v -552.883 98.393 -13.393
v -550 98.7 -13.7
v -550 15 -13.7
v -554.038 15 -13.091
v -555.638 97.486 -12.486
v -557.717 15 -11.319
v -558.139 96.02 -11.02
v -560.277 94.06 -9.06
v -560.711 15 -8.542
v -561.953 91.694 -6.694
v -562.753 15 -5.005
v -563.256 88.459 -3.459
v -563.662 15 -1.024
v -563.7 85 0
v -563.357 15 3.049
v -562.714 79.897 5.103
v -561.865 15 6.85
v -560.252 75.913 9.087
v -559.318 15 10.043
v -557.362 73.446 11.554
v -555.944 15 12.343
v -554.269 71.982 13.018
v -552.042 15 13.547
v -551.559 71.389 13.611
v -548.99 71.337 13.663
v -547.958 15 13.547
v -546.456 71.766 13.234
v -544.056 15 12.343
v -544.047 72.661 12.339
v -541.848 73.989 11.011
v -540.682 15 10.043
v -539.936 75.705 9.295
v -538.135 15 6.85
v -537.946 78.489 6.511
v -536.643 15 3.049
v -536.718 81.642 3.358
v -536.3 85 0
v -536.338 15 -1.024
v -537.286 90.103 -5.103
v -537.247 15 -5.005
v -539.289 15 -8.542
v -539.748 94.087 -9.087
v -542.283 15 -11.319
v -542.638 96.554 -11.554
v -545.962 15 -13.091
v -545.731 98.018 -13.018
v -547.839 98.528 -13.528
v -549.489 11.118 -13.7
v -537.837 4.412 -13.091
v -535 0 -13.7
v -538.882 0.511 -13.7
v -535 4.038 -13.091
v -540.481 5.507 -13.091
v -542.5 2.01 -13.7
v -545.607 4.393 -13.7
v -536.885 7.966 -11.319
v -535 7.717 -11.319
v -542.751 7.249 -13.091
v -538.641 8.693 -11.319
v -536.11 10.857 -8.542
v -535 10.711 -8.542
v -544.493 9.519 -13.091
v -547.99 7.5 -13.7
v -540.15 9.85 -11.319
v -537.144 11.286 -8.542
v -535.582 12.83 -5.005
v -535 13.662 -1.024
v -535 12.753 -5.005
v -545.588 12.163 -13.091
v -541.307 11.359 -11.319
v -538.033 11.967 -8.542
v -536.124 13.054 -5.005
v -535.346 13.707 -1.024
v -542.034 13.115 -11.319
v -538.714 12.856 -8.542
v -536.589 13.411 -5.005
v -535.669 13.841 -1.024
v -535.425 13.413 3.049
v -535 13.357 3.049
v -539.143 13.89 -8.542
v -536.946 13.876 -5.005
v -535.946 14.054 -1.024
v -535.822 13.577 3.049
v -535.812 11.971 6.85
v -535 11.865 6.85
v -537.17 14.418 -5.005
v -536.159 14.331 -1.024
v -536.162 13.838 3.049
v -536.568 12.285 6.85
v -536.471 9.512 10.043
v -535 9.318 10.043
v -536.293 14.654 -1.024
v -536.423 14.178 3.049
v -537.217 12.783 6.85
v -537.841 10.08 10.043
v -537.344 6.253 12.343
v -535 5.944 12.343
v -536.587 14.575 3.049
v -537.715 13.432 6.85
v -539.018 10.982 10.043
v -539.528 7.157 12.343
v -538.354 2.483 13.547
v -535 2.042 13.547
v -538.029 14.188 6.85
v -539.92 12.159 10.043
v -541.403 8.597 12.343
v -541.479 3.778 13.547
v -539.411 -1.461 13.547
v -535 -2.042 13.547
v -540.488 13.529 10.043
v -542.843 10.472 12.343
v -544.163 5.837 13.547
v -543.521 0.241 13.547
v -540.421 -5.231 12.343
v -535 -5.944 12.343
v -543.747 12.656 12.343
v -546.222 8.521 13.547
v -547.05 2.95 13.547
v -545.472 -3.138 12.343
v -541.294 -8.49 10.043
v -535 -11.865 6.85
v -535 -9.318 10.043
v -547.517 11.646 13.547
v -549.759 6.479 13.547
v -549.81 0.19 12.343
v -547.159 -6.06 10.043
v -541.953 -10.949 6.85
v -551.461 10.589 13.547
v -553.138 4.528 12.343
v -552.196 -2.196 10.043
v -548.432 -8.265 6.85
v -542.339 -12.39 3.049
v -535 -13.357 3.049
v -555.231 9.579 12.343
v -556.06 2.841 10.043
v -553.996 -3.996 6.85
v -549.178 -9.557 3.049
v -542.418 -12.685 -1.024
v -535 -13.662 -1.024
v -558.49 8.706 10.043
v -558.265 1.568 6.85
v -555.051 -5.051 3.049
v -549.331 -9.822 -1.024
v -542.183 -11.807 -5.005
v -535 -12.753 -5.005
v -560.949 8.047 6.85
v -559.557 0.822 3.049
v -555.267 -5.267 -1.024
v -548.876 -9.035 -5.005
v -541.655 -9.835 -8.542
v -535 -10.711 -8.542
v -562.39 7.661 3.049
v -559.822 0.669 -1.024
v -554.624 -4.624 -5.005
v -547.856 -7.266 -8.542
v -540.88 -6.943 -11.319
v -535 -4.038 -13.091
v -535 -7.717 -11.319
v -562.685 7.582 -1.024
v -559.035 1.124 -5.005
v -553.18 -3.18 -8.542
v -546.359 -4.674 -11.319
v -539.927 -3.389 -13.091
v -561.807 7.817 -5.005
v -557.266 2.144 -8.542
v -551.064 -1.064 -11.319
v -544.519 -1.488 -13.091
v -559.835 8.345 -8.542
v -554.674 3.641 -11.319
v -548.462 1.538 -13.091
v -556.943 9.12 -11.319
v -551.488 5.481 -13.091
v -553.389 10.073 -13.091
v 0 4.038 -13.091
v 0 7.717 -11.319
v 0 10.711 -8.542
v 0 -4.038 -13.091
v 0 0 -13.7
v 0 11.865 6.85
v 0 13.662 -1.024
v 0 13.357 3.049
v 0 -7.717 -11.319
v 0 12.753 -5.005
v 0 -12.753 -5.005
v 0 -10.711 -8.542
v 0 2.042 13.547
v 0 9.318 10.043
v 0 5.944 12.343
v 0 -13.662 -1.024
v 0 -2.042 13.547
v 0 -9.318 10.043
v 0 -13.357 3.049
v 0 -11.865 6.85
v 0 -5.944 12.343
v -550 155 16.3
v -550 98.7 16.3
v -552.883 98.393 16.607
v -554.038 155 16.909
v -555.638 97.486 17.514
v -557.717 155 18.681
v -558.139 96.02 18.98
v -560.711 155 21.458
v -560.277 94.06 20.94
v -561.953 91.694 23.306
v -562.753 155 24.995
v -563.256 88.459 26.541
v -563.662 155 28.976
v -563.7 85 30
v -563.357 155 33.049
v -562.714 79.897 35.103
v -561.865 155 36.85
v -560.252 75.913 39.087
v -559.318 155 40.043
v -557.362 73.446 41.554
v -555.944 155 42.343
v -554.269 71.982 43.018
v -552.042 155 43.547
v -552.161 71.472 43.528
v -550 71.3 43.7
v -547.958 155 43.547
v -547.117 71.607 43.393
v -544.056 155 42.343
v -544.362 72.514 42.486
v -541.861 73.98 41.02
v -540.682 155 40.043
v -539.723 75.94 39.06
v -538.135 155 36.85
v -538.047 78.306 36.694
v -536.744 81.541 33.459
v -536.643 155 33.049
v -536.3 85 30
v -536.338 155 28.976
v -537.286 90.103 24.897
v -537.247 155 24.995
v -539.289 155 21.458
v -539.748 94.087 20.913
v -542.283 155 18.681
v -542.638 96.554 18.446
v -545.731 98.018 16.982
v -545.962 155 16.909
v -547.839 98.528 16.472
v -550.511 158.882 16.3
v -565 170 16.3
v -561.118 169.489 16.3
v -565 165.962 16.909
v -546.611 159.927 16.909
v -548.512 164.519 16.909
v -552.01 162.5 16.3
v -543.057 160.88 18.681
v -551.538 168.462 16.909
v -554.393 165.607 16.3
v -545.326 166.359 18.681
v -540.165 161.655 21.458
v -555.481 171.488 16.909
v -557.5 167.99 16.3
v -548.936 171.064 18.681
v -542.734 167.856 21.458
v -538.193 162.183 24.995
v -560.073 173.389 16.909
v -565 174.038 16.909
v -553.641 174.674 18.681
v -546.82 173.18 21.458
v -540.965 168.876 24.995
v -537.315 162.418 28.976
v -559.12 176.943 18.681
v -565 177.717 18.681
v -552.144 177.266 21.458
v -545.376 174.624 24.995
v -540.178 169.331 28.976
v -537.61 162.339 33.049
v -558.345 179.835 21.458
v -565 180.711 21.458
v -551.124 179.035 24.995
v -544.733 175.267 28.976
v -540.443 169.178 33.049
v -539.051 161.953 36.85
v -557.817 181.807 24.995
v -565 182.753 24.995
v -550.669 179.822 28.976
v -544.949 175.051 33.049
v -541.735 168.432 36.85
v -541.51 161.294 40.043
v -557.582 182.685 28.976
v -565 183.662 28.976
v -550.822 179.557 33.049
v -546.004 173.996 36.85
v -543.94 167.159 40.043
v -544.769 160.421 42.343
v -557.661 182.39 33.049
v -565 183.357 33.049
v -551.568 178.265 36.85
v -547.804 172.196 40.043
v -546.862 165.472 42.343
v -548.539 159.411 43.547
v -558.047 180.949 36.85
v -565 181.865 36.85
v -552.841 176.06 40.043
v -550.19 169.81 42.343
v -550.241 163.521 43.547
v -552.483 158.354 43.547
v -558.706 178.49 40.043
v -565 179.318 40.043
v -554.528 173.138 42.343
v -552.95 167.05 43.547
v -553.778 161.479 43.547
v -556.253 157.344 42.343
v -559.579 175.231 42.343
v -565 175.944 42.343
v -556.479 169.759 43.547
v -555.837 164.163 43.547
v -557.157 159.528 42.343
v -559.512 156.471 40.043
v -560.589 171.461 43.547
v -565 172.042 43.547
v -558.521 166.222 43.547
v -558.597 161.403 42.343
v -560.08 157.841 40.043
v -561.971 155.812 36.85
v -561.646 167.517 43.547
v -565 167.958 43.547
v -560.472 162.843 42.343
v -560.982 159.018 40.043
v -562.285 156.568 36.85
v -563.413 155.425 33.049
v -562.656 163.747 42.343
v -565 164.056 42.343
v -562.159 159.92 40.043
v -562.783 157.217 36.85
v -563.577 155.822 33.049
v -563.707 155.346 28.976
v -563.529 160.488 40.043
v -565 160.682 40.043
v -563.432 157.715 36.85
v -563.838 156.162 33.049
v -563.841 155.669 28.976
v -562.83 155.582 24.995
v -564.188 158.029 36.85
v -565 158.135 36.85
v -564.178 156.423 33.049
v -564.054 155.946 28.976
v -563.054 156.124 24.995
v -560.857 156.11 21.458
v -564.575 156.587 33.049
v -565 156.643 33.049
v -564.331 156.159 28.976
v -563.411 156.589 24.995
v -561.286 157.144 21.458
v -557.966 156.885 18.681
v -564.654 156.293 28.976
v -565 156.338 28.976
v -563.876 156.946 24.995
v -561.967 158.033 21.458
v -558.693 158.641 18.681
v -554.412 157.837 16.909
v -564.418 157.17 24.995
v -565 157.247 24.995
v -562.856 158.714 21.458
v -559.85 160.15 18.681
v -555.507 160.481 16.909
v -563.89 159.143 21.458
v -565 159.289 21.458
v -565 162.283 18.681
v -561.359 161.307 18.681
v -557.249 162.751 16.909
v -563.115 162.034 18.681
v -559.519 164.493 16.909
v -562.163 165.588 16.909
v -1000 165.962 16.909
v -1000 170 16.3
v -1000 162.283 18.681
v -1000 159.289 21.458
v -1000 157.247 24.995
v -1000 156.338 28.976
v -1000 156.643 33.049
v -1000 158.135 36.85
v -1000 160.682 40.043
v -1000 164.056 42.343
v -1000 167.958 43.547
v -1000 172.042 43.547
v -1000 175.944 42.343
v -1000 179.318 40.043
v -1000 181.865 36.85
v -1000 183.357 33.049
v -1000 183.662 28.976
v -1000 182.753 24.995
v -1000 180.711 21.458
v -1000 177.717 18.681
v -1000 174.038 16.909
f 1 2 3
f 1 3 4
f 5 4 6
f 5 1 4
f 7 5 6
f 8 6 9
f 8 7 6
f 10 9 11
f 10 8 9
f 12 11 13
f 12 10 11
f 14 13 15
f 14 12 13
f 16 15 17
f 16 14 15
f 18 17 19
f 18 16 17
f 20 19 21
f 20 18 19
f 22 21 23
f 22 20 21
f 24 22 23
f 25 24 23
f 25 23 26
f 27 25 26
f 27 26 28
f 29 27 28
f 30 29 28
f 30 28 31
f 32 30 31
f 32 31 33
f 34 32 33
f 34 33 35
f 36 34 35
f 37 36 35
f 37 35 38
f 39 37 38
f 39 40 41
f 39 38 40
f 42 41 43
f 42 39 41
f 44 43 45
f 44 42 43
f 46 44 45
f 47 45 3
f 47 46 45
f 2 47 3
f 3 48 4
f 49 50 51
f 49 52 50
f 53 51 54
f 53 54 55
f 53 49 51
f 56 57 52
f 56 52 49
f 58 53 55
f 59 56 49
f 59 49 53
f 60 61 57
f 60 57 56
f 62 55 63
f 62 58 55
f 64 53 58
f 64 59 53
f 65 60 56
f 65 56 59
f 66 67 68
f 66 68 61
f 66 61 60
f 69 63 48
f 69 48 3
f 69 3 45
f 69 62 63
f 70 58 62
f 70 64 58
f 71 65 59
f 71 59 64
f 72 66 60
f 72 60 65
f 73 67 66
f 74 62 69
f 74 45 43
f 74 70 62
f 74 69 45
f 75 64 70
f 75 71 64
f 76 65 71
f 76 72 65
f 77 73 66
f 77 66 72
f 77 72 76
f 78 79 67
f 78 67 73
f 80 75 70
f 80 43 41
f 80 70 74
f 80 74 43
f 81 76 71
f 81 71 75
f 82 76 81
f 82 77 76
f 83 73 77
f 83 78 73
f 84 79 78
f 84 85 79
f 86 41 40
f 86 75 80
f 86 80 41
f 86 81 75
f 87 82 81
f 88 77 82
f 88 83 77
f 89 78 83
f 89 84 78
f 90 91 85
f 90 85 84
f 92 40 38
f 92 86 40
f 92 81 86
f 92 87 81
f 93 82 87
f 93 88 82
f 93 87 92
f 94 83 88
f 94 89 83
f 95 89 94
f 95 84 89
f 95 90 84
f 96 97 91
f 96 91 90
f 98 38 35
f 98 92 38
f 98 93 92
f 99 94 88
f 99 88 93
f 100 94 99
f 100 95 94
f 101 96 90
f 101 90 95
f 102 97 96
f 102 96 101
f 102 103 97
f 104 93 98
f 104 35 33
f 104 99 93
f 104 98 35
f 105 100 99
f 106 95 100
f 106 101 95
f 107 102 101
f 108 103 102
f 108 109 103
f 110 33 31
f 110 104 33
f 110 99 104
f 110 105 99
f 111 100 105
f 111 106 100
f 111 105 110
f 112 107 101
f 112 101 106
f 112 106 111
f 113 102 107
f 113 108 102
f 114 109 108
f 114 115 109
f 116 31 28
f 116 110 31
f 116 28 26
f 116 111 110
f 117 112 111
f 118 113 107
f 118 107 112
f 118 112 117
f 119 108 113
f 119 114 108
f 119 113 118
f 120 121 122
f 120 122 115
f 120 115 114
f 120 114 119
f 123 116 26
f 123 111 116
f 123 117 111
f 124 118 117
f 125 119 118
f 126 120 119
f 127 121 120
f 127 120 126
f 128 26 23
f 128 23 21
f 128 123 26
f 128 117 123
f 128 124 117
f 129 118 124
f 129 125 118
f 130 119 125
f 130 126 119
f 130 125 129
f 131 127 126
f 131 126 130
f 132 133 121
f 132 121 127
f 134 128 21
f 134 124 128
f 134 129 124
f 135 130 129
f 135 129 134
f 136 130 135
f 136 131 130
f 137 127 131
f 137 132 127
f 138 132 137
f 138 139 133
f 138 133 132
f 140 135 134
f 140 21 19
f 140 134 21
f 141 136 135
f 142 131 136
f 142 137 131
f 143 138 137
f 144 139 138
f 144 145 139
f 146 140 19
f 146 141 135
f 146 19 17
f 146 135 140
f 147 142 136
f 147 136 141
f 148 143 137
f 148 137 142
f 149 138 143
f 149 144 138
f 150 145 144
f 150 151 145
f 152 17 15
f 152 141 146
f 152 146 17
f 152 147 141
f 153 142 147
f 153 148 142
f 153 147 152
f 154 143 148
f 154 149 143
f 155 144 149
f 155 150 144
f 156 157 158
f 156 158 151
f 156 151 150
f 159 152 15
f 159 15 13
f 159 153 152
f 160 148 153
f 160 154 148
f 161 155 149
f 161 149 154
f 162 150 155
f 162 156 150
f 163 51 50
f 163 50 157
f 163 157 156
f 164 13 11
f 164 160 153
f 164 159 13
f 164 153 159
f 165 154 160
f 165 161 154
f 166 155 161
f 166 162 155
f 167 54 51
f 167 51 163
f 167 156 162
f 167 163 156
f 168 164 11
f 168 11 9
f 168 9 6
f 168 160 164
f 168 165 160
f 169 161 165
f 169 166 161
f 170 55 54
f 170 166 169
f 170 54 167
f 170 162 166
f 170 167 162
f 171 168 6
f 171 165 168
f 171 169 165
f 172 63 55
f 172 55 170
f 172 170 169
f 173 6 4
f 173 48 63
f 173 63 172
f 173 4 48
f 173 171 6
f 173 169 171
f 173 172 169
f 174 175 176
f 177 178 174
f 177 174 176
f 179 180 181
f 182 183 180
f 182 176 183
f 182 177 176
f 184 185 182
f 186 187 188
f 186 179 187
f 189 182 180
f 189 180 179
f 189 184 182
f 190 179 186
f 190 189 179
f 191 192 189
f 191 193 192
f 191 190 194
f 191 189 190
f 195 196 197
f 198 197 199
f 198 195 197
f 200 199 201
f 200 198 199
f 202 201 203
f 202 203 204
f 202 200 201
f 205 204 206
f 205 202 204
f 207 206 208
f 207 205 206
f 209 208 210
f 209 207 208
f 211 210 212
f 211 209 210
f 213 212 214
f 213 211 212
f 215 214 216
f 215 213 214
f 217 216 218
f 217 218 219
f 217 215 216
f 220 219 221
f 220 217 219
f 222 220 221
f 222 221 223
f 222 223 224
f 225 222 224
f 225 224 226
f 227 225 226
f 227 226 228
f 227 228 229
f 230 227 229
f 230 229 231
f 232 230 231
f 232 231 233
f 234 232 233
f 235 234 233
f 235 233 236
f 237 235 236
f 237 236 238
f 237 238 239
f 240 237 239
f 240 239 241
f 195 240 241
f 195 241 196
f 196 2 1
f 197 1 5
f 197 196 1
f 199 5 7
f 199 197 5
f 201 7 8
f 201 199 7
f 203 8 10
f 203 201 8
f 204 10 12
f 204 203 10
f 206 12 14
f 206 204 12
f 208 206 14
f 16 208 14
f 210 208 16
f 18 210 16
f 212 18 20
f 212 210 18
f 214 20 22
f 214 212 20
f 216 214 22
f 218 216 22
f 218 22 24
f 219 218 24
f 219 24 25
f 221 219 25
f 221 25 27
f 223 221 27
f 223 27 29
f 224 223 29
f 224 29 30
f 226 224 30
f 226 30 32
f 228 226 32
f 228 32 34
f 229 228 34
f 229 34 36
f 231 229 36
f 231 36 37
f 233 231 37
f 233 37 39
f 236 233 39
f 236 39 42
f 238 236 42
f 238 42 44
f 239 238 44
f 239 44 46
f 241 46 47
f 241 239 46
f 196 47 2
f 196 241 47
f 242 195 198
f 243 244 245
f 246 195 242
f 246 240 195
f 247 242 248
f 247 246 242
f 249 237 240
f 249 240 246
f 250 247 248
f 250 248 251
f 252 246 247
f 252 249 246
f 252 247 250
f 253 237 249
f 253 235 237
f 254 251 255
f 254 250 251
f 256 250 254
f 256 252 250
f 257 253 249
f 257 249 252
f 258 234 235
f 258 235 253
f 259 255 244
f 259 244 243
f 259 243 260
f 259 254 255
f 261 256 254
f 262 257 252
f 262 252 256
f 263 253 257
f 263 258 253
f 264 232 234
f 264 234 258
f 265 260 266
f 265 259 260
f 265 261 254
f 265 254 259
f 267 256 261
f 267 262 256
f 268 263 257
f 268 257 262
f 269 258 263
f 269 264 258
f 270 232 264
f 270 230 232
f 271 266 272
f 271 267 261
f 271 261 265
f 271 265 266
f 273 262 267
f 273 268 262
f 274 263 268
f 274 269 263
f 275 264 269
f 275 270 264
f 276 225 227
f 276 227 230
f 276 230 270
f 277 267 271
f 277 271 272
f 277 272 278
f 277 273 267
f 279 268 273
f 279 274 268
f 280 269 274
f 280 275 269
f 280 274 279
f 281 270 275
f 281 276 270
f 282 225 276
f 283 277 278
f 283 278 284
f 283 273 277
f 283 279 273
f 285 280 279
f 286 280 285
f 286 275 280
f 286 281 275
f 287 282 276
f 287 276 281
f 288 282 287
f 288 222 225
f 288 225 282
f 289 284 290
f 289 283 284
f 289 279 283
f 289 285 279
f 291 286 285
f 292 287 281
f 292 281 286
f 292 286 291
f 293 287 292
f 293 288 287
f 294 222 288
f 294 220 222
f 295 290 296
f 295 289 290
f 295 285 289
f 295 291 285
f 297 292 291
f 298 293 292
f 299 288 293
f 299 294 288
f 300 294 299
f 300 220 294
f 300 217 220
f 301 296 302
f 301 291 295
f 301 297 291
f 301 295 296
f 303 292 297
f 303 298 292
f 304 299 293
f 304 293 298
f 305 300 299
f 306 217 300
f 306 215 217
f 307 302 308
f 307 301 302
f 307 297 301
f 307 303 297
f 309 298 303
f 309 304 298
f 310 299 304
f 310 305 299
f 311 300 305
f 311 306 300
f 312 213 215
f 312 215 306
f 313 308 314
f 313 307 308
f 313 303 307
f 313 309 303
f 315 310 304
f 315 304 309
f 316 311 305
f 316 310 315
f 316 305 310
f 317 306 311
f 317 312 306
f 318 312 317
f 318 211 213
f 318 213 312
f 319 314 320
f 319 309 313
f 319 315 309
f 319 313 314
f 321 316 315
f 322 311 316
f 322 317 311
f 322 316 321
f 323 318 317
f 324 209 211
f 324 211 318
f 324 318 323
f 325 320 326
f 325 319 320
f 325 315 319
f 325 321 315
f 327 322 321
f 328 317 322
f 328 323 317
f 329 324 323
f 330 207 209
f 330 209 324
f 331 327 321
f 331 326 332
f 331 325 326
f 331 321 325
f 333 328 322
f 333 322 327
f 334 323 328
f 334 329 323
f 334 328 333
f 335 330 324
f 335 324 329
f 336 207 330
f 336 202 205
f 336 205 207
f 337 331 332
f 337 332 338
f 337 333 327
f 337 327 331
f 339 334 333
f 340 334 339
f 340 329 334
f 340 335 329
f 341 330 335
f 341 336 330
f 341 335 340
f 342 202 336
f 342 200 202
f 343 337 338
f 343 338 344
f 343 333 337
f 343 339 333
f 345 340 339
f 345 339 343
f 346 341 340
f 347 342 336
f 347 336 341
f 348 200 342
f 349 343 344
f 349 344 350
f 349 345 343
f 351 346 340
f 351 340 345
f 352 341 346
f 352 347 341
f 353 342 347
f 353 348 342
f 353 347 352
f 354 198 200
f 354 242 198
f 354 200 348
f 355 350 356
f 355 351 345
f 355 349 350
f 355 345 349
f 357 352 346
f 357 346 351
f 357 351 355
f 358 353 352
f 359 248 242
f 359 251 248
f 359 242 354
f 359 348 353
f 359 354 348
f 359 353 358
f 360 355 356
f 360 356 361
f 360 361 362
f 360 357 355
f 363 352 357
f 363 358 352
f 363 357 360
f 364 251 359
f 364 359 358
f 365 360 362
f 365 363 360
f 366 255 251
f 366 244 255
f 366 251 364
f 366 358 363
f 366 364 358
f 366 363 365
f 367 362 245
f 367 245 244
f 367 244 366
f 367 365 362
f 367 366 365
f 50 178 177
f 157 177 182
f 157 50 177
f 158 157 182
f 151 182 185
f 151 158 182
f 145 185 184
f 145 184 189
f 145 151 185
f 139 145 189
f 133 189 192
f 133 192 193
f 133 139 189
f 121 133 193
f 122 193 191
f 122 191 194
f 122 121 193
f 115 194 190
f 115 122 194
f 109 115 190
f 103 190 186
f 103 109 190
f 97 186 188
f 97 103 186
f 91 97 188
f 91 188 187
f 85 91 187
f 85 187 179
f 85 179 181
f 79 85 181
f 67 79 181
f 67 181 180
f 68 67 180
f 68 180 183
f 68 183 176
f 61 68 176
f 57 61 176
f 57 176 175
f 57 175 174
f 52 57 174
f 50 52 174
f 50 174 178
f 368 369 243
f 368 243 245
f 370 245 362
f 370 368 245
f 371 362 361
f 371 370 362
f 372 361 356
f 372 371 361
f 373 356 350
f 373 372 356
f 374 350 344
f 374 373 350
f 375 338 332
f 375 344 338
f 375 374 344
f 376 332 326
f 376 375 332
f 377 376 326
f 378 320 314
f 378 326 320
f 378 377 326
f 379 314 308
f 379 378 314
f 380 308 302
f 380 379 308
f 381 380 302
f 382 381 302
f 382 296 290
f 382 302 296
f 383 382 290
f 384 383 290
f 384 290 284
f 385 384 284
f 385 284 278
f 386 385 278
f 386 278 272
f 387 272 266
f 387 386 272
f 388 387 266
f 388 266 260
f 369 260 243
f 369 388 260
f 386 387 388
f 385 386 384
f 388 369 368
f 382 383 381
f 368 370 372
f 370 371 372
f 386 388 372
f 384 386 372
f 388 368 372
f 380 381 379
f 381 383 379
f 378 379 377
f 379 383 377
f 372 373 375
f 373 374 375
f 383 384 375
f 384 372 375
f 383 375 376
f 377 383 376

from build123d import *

# Parameters (mm, degrees)
CROQUIS1_R = 13.7


with BuildPart() as part:
    # Barrer1: sweep along a curve in space
    with BuildLine() as barrer1_path:
        Line((0, 0, 0), (-535, 0, 0))
        ThreePointArc((-535, 0, 0), (-545.606601718, 4.393398282, 0), (-550, 15, 0))
        Line((-550, 15, 0), (-550, 85, 0))
        Line((-550, 85, 0), (-550, 85, 30))
        Line((-550, 85, 30), (-550, 155, 30))
        ThreePointArc((-550, 155, 30), (-554.393398282, 165.606601718, 30), (-565, 170, 30))
        Line((-565, 170, 30), (-1000, 170, 30))
    # Croquis1 → Barrer1 (sweep)
    with BuildSketch(Plane(origin=(0, 0, 0), x_dir=(0, 0, -1), z_dir=(1, 0, 0))):
        Circle(CROQUIS1_R)
    sweep(path=barrer1_path.line, transition=Transition.RIGHT)


solid = part.part
